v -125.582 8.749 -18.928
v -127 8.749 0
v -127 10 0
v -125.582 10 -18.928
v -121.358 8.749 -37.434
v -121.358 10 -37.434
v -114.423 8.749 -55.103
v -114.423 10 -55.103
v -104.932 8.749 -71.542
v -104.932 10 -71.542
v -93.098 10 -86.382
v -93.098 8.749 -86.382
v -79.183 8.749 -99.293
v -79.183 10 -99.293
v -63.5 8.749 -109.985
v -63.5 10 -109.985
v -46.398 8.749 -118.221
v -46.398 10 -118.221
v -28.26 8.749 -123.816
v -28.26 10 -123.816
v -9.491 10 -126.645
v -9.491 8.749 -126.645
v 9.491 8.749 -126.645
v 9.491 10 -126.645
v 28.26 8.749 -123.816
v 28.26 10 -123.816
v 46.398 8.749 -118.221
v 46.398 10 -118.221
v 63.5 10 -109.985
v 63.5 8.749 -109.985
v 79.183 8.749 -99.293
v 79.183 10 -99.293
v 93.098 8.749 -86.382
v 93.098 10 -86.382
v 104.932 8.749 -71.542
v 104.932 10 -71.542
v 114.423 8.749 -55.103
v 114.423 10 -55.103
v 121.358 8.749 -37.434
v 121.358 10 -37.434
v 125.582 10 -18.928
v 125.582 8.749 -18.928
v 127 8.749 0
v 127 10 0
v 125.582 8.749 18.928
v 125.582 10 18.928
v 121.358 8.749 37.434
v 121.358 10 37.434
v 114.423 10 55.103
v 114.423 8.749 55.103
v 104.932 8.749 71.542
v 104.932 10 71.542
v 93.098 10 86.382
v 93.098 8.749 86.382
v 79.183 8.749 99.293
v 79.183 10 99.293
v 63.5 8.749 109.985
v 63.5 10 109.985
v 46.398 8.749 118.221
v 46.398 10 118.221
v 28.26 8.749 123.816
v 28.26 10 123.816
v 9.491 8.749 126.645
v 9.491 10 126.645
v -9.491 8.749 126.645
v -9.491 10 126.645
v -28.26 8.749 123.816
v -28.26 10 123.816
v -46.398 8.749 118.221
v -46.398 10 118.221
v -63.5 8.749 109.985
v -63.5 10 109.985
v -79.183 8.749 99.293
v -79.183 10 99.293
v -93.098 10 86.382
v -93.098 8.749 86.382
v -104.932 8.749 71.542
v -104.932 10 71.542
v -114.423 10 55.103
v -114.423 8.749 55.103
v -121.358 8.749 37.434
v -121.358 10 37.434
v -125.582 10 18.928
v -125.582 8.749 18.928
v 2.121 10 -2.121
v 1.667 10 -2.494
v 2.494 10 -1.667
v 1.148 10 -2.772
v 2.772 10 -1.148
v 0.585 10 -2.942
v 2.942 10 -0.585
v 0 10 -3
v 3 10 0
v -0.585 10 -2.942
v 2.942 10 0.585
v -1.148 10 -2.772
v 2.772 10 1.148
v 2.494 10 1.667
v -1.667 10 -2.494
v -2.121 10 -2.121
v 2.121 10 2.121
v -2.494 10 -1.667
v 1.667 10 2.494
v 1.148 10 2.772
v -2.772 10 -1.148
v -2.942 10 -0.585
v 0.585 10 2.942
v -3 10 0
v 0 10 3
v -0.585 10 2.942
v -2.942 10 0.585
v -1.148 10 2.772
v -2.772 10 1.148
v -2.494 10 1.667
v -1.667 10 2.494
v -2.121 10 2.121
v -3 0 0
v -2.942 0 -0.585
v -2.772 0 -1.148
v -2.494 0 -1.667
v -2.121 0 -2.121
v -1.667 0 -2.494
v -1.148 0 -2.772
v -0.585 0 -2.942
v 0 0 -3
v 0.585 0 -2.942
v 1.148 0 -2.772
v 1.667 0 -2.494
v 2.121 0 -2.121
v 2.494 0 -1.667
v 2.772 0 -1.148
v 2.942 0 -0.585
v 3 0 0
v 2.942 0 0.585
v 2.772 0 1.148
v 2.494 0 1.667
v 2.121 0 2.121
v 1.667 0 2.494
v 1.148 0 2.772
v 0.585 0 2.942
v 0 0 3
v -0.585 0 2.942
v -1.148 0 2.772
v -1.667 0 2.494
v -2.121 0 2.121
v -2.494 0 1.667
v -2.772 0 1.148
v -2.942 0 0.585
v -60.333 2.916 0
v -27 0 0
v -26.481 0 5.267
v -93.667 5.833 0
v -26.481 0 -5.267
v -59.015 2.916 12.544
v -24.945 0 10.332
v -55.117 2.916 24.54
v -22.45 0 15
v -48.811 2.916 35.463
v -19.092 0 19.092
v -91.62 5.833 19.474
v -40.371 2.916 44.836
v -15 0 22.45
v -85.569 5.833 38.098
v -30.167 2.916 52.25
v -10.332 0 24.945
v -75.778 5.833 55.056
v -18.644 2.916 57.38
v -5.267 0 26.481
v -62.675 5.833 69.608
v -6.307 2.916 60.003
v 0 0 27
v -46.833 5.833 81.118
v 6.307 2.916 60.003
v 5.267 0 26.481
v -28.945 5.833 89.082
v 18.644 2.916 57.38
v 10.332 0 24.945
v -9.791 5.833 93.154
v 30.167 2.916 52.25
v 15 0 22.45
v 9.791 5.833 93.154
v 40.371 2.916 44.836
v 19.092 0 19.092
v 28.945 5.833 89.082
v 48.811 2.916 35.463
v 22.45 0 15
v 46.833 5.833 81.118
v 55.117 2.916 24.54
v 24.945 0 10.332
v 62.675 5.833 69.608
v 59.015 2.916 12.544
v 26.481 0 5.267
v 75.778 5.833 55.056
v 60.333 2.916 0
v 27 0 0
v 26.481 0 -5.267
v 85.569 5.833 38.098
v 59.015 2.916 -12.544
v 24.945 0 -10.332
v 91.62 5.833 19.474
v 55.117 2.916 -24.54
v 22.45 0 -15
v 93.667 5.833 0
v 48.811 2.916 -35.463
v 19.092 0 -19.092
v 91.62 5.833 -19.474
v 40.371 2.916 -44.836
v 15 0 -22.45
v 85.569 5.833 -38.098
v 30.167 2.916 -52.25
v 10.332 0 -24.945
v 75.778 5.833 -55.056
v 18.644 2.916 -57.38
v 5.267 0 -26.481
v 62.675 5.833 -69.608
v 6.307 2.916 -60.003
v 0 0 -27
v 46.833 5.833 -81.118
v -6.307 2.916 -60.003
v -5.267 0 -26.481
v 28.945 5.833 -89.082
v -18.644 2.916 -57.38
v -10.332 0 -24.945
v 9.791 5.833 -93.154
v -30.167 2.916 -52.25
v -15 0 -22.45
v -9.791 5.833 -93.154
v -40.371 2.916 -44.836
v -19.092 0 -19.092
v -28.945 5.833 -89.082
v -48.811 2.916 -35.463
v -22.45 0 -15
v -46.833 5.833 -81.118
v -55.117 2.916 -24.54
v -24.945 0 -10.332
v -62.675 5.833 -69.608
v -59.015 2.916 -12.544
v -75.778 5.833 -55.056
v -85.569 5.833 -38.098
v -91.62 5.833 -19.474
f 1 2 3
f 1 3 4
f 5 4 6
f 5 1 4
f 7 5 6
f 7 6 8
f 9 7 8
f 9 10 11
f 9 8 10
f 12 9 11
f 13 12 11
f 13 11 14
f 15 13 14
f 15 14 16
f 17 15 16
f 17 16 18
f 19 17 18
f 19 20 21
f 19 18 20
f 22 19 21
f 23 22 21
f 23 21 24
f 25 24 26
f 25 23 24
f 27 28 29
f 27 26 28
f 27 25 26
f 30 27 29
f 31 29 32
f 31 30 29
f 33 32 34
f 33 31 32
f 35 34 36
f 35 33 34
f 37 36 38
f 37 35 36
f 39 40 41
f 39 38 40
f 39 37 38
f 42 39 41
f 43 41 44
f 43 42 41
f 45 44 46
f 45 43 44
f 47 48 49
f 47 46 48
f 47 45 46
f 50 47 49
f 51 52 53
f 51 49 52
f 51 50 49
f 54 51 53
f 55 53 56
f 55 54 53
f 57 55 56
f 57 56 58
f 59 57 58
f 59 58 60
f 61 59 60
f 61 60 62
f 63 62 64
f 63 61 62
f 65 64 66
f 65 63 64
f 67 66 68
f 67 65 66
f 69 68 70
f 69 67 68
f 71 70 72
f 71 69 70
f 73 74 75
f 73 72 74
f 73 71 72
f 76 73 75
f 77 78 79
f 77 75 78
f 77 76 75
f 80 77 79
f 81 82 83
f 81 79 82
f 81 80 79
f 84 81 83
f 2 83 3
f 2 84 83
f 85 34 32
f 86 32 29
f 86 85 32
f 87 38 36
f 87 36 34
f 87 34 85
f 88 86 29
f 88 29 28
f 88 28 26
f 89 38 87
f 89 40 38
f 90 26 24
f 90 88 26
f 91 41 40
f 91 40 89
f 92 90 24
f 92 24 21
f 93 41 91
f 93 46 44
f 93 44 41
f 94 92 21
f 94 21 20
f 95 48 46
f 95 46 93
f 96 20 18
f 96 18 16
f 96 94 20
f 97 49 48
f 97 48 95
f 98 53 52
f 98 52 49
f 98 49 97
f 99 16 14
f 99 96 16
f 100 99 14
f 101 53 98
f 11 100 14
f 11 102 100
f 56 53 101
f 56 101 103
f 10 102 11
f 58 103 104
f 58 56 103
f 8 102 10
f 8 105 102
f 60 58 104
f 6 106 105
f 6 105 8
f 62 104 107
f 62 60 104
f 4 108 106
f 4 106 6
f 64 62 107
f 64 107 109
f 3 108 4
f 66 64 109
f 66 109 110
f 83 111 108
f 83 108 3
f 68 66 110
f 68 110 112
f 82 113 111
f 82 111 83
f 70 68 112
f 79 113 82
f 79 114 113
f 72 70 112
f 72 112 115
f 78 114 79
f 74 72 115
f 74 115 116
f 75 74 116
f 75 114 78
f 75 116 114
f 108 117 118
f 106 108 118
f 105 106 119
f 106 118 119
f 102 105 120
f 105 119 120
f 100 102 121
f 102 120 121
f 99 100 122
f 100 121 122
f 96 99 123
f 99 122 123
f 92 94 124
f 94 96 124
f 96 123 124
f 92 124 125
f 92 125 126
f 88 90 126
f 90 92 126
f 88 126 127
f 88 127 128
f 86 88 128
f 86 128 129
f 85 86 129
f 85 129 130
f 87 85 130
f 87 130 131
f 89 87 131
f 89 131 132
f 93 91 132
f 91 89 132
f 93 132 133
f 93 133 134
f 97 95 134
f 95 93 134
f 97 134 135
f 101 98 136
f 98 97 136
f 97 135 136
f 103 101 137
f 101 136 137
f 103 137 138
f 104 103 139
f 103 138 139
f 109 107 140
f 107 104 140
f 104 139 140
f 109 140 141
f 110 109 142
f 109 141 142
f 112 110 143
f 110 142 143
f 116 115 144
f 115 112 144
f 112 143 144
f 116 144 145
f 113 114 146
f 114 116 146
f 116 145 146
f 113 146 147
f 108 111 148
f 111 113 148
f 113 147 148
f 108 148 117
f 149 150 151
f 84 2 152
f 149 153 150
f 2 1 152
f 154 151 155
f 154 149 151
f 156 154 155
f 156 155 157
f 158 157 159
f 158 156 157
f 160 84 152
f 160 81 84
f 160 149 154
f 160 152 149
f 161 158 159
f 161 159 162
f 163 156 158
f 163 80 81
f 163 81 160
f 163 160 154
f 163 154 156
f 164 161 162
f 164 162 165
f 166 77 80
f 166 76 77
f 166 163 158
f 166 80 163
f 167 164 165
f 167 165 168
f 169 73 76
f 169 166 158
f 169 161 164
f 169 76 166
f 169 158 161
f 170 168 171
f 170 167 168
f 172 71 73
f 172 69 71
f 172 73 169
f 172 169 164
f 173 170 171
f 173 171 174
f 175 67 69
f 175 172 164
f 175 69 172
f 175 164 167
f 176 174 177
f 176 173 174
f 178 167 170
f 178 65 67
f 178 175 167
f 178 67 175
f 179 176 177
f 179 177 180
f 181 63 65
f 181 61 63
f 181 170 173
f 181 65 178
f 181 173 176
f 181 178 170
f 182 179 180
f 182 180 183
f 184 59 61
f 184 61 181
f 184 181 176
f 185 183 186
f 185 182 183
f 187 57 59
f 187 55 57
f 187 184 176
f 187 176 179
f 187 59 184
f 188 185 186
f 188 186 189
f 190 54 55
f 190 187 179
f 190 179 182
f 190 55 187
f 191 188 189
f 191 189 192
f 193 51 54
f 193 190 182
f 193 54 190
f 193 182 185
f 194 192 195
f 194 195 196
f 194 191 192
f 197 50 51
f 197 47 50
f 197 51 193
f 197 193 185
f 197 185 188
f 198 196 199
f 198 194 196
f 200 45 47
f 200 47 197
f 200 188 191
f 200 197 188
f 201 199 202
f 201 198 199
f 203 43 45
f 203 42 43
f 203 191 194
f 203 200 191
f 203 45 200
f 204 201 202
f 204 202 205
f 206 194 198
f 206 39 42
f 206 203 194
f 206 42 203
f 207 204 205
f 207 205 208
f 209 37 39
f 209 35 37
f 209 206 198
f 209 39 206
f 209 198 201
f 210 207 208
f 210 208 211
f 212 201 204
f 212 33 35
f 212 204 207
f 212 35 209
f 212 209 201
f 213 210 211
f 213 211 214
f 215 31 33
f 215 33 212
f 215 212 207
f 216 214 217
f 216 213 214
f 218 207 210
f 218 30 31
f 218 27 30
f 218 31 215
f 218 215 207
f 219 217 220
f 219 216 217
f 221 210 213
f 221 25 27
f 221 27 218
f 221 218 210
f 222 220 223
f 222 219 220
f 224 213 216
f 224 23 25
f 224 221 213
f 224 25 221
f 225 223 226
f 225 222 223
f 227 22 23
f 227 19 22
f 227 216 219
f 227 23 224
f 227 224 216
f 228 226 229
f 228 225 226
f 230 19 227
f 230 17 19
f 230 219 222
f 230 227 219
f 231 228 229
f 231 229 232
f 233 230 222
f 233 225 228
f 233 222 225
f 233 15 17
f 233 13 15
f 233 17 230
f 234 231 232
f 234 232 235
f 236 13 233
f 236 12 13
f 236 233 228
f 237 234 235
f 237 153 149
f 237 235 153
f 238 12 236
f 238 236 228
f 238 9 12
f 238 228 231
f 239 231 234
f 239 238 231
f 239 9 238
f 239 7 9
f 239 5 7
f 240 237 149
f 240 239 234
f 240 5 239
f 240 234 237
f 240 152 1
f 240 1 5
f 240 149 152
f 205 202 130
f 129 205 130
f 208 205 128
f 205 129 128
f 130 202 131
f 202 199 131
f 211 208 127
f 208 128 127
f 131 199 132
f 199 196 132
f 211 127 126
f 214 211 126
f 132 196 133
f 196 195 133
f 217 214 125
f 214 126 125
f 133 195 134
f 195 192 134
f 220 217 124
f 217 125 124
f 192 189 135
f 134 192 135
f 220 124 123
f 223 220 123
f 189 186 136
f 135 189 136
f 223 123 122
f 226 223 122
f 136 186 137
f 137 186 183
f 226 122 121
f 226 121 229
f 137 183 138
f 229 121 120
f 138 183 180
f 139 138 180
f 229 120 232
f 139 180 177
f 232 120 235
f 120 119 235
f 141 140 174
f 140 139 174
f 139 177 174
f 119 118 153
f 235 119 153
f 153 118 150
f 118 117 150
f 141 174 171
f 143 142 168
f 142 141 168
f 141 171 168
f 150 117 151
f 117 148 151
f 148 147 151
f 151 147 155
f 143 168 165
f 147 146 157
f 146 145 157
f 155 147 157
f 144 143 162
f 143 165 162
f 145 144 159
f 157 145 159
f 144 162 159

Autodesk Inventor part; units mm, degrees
ref_plane "YZ Plane" through (0, 0, 0) normal (1, 0, 0) x (0, 1, 0)
ref_plane "XZ Plane" through (0, 0, 0) normal (0, 1, 0) x (-1, 0, 0)
ref_plane "XY Plane" through (0, 0, 0) normal (0, 0, 1) x (1, 0, 0)
sketch "Skizze1" plane through (0, 0, 0) normal (0, 1, 0) x (-1, 0, 0)
  circle A0 centre (0, 0) radius 3
  line L0 (-20, -4) -> (20, -4)
  line L1 (20, -4) -> (20, 4)
  line L2 (20, 4) -> (-20, 4)
  line L3 (-20, 4) -> (-20, -4)
  line L4 (-20, -4) -> (20, 4) construction
  line L5 (20, -4) -> (-20, 4) construction
  dimension "d0" = 6
  dimension "d1" = 40
  dimension "d2" = 8
extrude "Extrusion1" add sketch "Skizze1" along normal blind 10
sketch "Skizze2" plane through (0, 0, 0) normal (0, 1, 0) x (-1, 0, 0)
  circle A0 centre (0, 0) radius 127
  circle A1 centre (0, 0) radius 3 projected
  dimension "d6" = 254
extrude "Extrusion2" add sketch "Skizze2" along normal blind 10
chamfer "Fase1" distance 100 angle 5 1 edges at (127, 0, 0) measured on face at (84.8365, 0, -10.6241)
equation "\"G_L\" = 0"
equation "\"G_H\" = 0"
equation "\"G_B\" = 0"
properties part number "Props" material "GEDA Plexiglas"
